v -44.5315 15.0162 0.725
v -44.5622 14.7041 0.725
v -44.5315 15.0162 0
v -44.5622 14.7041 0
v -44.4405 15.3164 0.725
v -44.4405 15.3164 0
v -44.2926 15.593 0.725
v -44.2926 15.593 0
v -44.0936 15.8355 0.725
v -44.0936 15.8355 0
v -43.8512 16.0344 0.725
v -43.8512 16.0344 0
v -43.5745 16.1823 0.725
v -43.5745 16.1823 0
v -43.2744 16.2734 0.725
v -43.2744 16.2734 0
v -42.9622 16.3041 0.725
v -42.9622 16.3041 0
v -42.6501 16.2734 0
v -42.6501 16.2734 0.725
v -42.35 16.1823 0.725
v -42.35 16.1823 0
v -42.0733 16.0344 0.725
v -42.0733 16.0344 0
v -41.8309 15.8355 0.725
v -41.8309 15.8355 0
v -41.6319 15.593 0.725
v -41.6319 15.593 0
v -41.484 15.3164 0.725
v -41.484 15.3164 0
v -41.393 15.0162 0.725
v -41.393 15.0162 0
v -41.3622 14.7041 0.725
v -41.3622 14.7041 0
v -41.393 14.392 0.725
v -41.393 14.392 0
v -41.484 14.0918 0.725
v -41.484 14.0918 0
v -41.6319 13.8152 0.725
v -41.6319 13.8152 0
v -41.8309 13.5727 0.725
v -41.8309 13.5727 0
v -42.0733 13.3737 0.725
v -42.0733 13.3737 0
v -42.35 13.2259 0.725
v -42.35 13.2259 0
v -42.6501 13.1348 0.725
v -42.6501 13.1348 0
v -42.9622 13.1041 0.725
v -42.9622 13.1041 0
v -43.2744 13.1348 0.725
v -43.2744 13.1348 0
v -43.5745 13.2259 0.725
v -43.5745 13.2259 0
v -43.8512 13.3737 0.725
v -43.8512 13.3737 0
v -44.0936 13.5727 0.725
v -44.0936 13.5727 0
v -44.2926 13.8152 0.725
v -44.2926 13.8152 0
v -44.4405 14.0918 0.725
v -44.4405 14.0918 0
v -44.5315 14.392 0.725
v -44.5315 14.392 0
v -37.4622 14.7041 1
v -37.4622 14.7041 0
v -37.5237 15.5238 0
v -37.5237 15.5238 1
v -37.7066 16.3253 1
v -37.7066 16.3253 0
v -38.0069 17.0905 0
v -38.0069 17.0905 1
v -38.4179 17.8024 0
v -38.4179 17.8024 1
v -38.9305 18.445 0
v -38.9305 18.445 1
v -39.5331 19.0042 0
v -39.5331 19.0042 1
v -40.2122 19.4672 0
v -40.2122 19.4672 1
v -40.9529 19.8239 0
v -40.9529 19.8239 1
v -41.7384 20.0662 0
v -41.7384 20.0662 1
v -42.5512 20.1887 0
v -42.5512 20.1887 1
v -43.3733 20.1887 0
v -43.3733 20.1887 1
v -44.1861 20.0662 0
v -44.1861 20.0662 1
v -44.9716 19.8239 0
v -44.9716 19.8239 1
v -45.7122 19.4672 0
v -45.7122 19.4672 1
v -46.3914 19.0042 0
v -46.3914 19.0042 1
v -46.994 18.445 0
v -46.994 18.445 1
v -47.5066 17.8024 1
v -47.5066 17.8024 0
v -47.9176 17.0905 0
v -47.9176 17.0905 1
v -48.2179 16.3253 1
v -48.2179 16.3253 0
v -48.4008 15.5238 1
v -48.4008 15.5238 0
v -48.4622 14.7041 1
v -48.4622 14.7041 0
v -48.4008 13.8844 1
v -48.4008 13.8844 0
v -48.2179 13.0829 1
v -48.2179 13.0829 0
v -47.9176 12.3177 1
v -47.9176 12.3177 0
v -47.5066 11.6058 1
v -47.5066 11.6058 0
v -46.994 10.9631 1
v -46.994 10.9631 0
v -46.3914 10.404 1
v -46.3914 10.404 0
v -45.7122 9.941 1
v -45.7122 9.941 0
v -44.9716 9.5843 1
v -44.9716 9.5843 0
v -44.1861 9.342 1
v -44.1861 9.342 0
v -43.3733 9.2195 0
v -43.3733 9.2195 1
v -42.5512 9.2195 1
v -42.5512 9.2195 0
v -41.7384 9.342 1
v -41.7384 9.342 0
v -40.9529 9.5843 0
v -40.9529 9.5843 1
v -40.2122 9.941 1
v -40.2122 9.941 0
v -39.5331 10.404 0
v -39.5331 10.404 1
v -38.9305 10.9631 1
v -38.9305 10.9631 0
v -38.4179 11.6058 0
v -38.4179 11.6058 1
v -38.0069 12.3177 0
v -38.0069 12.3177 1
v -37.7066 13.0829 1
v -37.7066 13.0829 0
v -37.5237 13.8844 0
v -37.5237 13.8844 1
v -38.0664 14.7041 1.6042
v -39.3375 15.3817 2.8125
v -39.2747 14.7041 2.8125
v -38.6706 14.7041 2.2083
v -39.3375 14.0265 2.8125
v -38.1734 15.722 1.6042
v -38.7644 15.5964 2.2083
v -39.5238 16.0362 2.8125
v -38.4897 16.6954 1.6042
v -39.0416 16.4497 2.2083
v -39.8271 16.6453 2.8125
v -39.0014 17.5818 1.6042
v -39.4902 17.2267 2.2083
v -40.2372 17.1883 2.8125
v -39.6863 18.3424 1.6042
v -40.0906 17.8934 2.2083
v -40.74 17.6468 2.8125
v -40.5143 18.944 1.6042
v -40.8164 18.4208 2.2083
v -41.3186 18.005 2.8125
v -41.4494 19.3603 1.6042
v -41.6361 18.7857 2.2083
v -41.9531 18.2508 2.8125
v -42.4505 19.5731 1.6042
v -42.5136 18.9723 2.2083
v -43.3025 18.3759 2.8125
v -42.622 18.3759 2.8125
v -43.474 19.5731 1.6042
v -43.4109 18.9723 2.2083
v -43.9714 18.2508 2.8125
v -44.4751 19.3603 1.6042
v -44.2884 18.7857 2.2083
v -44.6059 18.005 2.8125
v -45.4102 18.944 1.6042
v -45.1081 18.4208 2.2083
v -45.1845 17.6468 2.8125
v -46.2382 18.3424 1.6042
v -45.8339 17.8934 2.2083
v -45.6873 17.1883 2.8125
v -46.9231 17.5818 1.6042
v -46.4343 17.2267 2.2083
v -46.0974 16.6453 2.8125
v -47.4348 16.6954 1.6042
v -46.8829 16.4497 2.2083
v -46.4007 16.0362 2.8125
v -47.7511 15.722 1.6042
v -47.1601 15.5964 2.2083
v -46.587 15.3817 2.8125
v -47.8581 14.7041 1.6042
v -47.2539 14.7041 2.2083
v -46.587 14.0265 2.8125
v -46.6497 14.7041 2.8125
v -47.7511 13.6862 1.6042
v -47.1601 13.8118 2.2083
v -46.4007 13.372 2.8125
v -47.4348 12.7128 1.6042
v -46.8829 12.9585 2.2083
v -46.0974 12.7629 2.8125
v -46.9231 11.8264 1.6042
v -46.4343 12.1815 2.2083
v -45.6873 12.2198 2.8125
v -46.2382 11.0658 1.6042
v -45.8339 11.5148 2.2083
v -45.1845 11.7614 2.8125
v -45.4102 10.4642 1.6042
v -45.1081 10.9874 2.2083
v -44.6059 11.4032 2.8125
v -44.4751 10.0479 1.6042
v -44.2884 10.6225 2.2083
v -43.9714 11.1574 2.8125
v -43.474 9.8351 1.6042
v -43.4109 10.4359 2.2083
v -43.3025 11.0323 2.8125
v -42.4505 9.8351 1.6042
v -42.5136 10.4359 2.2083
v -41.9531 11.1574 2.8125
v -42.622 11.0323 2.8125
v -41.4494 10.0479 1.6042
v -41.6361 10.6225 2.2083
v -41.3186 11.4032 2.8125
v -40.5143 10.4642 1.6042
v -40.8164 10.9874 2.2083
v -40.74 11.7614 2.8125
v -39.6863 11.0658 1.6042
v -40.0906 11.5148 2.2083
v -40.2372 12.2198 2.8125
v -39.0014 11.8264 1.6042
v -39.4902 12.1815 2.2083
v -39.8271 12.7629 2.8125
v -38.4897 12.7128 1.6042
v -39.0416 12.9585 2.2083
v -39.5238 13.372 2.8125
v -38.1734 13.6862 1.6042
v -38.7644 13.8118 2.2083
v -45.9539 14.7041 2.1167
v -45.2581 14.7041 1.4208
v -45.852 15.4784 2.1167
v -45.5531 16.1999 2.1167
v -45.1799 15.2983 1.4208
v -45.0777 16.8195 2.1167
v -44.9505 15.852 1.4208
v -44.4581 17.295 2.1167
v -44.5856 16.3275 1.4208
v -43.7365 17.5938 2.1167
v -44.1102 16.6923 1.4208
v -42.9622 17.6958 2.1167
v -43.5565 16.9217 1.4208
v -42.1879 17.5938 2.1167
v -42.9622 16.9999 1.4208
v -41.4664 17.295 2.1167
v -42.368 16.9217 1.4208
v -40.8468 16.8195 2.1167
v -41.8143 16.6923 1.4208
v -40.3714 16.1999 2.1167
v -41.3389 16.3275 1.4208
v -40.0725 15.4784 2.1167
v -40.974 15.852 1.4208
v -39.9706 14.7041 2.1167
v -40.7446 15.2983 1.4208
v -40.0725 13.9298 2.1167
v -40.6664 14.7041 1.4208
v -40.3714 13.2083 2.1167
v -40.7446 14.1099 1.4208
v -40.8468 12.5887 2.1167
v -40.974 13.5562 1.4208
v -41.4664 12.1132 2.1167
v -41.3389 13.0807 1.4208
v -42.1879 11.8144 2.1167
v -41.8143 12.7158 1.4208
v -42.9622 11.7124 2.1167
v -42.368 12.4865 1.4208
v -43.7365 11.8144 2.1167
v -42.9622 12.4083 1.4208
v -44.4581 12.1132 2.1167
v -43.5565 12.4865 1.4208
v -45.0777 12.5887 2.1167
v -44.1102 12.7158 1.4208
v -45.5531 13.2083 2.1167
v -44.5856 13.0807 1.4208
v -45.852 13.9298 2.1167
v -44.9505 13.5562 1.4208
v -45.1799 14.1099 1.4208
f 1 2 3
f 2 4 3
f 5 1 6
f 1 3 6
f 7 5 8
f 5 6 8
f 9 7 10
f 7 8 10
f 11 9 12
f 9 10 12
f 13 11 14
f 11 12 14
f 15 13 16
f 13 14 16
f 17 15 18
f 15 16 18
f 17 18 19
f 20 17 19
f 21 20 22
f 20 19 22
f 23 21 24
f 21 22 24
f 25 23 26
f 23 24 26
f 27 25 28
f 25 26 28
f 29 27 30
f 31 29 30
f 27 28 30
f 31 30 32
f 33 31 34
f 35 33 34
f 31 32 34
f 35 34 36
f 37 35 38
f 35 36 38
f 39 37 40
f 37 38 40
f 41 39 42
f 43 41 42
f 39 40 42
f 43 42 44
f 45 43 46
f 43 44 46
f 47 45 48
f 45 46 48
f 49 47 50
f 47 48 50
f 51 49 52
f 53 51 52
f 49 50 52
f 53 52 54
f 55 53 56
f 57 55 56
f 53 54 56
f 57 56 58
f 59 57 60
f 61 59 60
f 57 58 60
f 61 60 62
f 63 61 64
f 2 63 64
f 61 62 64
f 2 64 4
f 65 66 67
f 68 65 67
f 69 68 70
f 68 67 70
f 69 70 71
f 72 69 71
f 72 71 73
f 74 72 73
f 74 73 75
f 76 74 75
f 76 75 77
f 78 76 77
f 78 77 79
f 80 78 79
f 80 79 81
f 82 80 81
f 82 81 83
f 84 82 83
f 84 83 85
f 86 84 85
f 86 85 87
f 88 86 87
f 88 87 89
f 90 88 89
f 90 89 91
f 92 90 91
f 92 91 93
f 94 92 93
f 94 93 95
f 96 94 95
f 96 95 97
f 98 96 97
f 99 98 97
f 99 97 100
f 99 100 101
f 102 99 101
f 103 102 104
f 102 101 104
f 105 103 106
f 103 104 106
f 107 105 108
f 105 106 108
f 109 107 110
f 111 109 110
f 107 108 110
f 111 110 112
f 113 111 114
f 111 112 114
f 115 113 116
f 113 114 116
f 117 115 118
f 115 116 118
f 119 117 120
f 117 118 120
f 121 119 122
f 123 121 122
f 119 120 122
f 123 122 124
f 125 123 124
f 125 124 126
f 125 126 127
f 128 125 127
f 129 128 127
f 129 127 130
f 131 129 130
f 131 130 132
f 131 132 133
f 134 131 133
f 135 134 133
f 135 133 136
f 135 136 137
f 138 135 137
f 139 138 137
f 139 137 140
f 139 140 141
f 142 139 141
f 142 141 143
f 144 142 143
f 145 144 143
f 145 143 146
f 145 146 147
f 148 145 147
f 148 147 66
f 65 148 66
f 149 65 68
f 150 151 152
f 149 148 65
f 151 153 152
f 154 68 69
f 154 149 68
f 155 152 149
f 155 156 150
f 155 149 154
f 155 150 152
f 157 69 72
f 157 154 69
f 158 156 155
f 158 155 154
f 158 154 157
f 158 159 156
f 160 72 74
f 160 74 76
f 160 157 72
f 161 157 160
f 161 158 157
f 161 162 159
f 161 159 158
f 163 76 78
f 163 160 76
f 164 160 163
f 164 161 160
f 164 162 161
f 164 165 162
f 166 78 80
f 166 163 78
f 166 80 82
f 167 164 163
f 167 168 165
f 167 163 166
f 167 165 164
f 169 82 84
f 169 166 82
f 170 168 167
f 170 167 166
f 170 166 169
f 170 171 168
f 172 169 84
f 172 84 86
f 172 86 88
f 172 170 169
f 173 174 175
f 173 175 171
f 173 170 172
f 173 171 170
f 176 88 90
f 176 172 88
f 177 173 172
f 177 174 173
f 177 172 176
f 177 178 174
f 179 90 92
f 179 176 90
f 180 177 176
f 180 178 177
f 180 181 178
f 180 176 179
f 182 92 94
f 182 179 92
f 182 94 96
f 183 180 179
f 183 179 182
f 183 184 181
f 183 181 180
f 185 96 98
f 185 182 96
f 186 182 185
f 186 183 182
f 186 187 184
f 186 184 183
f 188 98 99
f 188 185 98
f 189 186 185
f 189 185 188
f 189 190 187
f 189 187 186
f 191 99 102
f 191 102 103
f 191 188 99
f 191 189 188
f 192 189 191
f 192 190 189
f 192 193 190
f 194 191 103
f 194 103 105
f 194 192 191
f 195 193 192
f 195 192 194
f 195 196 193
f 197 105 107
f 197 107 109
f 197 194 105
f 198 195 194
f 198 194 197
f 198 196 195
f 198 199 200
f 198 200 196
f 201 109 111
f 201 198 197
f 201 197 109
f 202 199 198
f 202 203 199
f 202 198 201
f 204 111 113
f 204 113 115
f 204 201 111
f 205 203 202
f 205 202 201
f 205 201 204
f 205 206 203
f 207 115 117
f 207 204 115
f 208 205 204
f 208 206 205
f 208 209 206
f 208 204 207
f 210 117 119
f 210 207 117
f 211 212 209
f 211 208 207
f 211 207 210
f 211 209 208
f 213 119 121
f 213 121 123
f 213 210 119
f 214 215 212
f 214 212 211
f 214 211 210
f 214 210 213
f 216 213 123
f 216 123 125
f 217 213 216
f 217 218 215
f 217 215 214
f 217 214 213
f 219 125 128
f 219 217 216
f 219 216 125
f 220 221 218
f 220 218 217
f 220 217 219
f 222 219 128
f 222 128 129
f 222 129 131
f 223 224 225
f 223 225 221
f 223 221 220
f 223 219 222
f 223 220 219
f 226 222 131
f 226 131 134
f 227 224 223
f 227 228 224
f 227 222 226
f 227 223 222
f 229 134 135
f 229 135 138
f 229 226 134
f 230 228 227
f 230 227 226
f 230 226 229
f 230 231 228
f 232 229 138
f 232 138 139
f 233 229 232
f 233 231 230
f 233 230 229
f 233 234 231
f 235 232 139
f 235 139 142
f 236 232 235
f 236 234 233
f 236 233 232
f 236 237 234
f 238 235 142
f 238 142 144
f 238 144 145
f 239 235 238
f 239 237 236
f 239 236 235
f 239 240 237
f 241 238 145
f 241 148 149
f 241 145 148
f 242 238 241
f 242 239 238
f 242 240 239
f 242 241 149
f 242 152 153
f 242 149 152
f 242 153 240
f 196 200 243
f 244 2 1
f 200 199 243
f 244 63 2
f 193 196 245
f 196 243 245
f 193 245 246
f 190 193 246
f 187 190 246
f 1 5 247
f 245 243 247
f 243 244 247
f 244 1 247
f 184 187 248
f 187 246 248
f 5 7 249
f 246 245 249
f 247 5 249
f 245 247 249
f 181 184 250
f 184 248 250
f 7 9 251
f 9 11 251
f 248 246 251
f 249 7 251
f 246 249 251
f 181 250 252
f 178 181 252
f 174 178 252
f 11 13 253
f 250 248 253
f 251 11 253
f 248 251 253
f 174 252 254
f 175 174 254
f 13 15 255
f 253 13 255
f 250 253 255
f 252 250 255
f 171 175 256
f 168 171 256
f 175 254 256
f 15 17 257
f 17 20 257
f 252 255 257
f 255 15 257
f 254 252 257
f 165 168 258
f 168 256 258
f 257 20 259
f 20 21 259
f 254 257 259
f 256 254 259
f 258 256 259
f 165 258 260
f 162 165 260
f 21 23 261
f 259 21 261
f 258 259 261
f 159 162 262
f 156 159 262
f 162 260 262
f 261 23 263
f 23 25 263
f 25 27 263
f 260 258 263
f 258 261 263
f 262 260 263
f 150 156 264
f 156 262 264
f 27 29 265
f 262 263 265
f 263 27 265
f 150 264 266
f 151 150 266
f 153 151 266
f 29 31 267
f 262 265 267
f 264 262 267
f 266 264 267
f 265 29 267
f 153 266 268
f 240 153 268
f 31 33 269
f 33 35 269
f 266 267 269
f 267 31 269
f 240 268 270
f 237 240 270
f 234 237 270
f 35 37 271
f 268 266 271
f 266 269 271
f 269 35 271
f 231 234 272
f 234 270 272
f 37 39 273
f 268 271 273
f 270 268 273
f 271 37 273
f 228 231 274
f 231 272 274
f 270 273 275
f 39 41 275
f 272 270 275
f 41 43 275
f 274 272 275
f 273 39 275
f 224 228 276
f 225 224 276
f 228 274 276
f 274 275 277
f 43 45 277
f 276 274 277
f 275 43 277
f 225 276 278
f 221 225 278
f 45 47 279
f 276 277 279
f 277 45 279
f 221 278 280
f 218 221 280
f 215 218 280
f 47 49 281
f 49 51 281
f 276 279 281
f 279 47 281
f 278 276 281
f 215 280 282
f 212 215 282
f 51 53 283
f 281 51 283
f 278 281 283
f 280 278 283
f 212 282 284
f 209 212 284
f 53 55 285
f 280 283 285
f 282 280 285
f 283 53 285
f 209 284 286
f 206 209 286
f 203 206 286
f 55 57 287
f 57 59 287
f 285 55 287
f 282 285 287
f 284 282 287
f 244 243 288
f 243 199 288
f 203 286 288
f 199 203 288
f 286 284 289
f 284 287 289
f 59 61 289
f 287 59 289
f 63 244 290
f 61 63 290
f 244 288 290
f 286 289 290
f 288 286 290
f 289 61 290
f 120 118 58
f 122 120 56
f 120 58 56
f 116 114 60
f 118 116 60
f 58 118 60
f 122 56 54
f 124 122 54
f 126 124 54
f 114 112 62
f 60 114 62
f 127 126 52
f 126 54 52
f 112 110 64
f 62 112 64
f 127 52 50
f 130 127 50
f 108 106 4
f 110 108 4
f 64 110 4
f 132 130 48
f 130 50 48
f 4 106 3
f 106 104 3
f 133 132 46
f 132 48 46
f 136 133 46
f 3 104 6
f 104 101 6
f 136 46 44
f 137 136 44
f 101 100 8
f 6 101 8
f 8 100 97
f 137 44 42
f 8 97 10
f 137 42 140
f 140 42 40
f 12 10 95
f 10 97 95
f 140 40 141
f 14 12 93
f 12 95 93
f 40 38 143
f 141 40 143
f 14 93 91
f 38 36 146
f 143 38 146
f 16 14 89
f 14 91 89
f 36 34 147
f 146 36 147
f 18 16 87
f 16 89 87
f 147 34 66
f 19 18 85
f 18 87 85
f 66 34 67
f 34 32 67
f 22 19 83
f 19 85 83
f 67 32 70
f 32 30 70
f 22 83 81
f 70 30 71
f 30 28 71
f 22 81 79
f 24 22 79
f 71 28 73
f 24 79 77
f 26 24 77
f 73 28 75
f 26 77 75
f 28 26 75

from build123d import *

# Parameters (mm, degrees)
F0_R           = 5.5
F1_DEPTH       = 3
F3_D           = 3.2
F3_DEPTH       = 12
F3_CSINK_D     = 7.75
F3_CSINK_ANGLE = 90
F3_TIP         = 0.9613769904


# Not quite as in the source:
# - a fillet or chamfer that OpenCascade refuses, or shapes differently, is made with other operations: its cross-section is extruded or revolved along the edge and cut away or added


with BuildPart() as f1:
    # F0 (on Top) → F1 (new body)
    with BuildSketch(Plane.XY):
        with Locations((-42.9622493684, 14.7040970623)):
            Circle(F0_R)
    extrude(amount=F1_DEPTH)

    # F3
    with Locations(Plane.XY.offset(3)):
        with Locations((-42.9622493684, 14.7040970623)):
            CounterSinkHole(F3_D / 2, F3_CSINK_D / 2, depth=F3_DEPTH, counter_sink_angle=F3_CSINK_ANGLE)
            with Locations((0, 0, -(F3_DEPTH + F3_TIP / 2))):  # 118° drill point
                Cone(0, F3_D / 2, F3_TIP, mode=Mode.SUBTRACT)

    # F4: chamfer of 2 on 1 edges, made by hand

    # F4_s1 → F4_t2 (revolve, cut)
    with BuildSketch(Plane.XZ.offset(-14.7040970623)):
        Polygon((-37.4622493684, 1), (-39.4622493684, 3), (-37.4622493684, 3), align=None)
    revolve(axis=Axis((-42.9622493684, 14.7040970623, 3), (0, 0, 1)), mode=Mode.SUBTRACT)


solid = f1.part
